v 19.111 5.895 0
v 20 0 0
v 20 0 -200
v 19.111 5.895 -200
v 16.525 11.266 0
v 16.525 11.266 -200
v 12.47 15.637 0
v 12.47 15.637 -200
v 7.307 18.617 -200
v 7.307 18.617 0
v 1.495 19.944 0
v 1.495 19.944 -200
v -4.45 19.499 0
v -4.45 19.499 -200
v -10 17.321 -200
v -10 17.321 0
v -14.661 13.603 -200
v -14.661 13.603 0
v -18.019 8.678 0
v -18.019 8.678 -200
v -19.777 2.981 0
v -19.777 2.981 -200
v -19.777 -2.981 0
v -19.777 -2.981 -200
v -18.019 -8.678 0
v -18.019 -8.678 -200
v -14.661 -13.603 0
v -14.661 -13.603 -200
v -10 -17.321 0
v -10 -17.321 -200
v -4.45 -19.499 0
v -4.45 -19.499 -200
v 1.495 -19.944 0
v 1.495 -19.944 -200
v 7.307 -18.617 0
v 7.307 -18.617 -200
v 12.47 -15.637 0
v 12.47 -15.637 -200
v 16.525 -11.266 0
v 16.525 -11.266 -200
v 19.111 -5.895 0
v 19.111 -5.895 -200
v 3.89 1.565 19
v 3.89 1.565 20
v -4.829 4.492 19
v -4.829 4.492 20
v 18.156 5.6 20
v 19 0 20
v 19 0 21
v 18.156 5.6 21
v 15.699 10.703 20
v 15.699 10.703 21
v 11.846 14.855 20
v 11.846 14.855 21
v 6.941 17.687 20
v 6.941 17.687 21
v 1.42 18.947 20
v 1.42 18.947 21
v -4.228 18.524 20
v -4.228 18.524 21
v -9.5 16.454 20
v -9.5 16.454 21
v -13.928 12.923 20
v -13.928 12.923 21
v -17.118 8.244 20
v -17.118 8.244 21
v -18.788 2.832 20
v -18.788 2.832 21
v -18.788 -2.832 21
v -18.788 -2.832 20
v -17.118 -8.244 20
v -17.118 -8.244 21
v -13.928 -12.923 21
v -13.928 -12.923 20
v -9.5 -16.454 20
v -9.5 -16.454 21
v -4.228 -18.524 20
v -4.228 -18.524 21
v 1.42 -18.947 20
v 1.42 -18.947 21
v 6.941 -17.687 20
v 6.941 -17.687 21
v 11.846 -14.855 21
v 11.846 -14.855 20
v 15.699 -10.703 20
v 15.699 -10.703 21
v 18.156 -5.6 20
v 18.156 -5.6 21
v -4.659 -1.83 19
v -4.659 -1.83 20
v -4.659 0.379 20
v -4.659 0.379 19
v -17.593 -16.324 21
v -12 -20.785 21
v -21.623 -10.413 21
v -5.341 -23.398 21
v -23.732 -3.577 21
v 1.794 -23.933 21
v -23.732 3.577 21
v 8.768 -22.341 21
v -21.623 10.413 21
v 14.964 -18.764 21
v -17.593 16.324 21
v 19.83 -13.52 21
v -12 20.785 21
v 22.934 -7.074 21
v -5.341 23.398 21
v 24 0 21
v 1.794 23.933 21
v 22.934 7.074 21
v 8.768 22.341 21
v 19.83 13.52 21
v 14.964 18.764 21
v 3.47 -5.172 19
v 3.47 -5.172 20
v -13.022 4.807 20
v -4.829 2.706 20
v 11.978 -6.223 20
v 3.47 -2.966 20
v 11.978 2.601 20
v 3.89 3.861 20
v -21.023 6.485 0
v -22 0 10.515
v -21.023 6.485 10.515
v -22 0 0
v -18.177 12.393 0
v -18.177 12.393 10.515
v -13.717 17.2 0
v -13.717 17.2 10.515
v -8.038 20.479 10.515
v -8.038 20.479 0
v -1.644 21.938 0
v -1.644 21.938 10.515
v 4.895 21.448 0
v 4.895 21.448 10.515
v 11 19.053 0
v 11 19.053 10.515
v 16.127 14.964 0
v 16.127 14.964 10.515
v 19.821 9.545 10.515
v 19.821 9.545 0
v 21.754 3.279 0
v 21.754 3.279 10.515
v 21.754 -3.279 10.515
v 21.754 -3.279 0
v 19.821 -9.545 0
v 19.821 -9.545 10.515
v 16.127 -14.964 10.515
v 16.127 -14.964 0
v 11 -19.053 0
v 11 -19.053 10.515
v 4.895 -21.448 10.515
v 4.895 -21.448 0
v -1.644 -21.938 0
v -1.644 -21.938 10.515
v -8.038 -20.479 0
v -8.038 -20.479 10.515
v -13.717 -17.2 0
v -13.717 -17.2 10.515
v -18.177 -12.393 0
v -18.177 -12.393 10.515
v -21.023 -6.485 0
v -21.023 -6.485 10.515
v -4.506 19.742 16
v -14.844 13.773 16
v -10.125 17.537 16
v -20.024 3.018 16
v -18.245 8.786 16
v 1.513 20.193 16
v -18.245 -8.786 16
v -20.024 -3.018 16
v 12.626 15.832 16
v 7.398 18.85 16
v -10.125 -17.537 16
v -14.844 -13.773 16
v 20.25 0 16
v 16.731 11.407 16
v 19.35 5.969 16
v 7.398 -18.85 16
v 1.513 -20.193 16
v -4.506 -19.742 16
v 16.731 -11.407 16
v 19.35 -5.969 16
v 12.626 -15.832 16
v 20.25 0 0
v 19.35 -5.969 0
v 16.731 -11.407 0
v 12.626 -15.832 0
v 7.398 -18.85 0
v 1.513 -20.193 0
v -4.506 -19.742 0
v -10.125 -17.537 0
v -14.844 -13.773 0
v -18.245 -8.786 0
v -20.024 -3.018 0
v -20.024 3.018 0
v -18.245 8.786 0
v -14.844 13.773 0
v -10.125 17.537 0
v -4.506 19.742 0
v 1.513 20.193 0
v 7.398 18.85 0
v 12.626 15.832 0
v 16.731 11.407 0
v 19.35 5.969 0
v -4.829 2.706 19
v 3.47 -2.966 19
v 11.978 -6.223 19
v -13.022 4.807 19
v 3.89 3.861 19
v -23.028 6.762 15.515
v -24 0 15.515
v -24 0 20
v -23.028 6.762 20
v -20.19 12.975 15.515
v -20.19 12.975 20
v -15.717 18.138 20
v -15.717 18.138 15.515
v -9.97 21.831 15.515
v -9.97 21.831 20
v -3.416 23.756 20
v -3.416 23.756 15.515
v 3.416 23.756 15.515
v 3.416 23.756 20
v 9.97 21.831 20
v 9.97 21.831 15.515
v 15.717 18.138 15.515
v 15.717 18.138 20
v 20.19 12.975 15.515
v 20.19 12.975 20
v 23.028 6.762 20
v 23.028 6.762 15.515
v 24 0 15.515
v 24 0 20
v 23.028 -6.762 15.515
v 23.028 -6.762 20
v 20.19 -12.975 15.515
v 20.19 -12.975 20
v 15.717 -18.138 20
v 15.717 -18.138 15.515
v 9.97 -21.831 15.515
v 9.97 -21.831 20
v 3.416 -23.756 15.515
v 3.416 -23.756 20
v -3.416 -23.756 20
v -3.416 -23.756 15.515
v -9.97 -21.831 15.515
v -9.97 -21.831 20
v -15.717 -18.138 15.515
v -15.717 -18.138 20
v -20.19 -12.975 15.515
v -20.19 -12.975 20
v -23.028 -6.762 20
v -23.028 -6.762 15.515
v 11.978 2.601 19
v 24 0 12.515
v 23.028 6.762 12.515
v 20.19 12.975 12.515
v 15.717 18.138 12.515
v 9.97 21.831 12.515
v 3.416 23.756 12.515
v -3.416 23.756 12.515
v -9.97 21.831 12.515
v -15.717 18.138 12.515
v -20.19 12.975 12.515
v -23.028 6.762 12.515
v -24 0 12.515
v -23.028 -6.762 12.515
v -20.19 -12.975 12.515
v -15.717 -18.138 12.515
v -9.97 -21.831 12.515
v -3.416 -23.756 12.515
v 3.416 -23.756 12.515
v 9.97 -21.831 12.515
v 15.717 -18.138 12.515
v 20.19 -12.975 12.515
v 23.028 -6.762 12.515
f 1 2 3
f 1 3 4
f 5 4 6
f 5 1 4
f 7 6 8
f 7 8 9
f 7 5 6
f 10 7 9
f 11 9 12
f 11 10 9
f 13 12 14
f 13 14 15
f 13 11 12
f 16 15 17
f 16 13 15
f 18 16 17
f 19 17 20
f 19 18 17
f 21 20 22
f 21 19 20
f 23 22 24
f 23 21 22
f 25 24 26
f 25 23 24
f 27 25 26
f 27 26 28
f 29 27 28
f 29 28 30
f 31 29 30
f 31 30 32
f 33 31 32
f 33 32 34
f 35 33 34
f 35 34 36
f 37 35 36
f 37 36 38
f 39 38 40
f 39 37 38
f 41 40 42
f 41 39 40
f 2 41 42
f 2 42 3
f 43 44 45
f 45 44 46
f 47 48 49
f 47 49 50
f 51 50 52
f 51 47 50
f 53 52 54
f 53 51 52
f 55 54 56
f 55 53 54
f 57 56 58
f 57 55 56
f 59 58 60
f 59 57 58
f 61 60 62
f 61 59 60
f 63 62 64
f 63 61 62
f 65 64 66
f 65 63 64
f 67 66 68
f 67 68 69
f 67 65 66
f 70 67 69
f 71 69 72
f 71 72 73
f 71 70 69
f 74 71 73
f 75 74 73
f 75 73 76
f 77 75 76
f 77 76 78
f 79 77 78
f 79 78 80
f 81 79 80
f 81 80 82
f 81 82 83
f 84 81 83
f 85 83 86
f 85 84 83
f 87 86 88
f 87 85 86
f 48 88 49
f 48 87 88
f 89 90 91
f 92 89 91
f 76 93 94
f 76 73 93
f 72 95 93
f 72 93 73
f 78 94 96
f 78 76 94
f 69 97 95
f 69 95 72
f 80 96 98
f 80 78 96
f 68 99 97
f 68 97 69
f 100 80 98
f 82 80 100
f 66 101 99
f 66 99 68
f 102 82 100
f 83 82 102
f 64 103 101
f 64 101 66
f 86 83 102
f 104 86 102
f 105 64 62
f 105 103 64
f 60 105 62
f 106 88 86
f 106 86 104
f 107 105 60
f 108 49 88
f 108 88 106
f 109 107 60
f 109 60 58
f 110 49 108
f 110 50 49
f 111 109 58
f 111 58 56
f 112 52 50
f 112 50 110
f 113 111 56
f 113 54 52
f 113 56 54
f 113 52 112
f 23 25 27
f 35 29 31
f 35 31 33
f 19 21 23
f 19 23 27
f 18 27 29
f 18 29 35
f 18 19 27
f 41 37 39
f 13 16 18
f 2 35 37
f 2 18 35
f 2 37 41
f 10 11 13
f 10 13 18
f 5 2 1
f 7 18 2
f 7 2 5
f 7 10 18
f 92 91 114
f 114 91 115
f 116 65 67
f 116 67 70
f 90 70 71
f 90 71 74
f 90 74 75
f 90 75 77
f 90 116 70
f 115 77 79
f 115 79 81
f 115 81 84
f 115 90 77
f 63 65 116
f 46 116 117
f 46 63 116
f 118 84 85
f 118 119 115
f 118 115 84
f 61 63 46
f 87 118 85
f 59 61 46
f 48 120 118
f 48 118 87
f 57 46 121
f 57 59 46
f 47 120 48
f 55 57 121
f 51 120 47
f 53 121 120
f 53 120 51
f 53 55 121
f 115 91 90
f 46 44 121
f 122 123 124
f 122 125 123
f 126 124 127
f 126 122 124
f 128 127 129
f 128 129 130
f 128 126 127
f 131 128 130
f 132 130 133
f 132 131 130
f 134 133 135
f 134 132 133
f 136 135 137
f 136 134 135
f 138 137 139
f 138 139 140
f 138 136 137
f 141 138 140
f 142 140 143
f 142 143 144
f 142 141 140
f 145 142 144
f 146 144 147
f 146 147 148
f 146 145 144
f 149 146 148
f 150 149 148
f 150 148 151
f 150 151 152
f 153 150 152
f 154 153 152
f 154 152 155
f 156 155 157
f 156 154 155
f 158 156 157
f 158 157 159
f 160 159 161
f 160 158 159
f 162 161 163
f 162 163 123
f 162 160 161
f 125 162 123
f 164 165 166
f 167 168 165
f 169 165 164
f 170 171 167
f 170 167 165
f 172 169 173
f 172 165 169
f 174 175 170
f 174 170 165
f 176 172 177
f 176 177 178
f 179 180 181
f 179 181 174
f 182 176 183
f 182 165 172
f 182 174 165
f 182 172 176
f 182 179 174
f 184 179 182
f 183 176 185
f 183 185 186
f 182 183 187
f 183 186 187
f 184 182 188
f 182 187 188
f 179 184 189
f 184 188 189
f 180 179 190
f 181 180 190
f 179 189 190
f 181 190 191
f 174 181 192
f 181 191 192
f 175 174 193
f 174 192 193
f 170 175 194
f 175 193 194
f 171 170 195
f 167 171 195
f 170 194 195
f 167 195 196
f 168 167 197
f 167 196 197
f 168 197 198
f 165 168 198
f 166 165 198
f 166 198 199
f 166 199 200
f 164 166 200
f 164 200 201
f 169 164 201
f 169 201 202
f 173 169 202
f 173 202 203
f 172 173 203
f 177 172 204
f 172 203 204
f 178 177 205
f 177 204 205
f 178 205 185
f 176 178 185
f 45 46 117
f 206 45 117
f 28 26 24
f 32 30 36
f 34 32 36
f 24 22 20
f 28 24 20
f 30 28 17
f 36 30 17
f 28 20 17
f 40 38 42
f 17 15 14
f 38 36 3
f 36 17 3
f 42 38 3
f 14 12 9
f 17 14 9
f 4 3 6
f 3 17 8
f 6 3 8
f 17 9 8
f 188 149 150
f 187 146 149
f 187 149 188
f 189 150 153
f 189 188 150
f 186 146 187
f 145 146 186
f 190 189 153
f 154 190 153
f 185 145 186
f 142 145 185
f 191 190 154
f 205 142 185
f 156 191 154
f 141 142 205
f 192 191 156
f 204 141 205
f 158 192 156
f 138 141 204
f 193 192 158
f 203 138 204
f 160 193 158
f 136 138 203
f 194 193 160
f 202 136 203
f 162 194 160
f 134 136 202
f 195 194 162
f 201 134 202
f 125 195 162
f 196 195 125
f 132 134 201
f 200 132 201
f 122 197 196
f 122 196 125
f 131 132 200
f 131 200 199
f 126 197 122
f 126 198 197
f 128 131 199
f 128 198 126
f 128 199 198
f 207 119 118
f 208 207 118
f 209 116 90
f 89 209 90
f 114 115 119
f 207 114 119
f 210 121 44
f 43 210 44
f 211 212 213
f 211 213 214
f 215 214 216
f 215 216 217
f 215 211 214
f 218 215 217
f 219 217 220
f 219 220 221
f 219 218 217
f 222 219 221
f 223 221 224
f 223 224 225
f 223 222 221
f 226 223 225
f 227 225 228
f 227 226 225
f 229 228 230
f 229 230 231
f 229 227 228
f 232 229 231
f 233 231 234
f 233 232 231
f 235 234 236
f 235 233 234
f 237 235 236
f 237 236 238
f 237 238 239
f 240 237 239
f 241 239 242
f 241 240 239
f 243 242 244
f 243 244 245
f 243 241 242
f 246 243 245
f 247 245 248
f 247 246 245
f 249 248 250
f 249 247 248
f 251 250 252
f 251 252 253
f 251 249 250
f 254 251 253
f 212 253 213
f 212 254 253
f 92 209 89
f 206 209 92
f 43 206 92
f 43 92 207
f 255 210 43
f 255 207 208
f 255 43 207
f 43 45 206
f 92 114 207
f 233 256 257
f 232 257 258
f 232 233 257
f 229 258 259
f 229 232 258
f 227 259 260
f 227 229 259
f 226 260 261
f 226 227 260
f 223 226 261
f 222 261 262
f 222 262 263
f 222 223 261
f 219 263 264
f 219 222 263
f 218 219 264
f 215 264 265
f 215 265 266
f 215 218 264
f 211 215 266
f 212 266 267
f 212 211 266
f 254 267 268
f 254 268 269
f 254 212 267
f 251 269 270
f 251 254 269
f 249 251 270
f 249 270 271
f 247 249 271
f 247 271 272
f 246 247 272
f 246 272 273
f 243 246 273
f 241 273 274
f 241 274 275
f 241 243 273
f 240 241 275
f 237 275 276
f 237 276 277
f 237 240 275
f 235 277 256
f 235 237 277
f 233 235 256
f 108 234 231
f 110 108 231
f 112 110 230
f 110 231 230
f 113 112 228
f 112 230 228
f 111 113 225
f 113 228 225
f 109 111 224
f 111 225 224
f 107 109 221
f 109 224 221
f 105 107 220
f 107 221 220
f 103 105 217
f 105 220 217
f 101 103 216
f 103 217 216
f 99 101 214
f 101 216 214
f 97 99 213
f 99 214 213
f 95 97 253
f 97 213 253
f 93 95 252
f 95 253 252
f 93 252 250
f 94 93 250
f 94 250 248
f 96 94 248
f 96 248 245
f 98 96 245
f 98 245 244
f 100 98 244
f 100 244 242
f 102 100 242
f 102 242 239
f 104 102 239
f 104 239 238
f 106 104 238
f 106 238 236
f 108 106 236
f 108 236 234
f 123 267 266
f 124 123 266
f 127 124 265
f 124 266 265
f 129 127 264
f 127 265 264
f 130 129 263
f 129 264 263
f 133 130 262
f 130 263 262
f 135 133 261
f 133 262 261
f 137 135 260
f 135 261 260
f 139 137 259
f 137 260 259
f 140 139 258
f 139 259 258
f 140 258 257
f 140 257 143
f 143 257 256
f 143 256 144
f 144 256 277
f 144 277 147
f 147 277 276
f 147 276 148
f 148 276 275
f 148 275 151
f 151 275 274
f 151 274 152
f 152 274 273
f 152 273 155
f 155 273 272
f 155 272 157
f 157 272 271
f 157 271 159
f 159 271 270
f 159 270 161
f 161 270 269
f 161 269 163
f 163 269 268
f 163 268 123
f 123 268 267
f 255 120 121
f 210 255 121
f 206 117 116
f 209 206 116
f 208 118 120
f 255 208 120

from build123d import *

# Parameters (mm, degrees)
F2_R         = 20
F3_DEPTH     = 200
F6_DEPTH     = 1
F5_R         = 24
F5_R_2       = 19
F7_DEPTH     = 1
F8_R         = 20.25
F9_DEPTH     = 16
F10_S5_R     = 24
F10_T6_DEPTH = 40


# Not quite as in the source:
# - a fillet or chamfer that OpenCascade refuses, or shapes differently, is made with other operations: its cross-section is extruded or revolved along the edge and cut away or added


with BuildPart() as f1:
    # F0 (on Front) → F1 (revolve)
    with BuildSketch(Plane.XZ):
        Polygon((-22, 0), (-20, 0), (0, 0), (0, 20), (-22, 20), (-24, 20), (-24, 15.5146932229), (-22, 15.5146932229), align=None)
    revolve(axis=Axis((0, 0, 10), (0, 0, -1)))

    # F5 (on face) → F6 (cut)
    with BuildSketch(Plane.XY.offset(20)):
        Polygon((11.9780020788, -6.2227640148), (11.9780020788, 2.6007659641), (3.8897663796, 3.8612704928), (3.8897663796, 1.5650035572), (-4.8287207231, 4.4915222406), (-4.8287207231, 2.705808496), (-13.0219979212, 4.8066484589), (-4.6587968989, -1.829864401), (-4.6587968989, 0.3787560728), (3.4695986625, -5.1723431725), (3.4695986625, -2.9664605056), align=None)
    extrude(amount=-F6_DEPTH, mode=Mode.SUBTRACT)

    # F5 (on face) → F7 (join)
    with BuildSketch(Plane.XY.offset(20)):
        Circle(F5_R)
        Circle(F5_R_2, mode=Mode.SUBTRACT)
    extrude(amount=F7_DEPTH)

    # F8 (on face) → F9 (cut)
    with BuildSketch(Plane(origin=(0, 0, 0), x_dir=(1, 0, 0), z_dir=(0, 0, -1))):
        Circle(F8_R)
    extrude(amount=-F9_DEPTH, mode=Mode.SUBTRACT)

    # F10: chamfer of 5 on 1 edges, made by hand


with BuildPart() as f3:
    # F2 (on Top) → F3 (new body)
    with BuildSketch(Plane.XY):
        Circle(F2_R)
    extrude(amount=-F3_DEPTH)


with BuildPart() as f10_tool2:
    # F10_s3 → F10_t4 (revolve)
    with BuildSketch(Plane.XZ):
        Polygon((-22, 10.5146932229), (-27, 15.5146932229), (-22, 15.5146932229), align=None)
    revolve(axis=Axis((0, 0, 15.5146932229), (0, 0, -1)))

    # F10_s5 → F10_t6 (intersect, symmetric)
    with BuildSketch(Plane.XY.offset(13)):
        Circle(F10_S5_R)
    extrude(amount=F10_T6_DEPTH, both=True, mode=Mode.INTERSECT)


with BuildPart() as f1_1:
    add(f1.part)

    # F10_t1: union F10_tool2
    add(f10_tool2.part)


solid = Compound([f3.part, f1_1.part])
